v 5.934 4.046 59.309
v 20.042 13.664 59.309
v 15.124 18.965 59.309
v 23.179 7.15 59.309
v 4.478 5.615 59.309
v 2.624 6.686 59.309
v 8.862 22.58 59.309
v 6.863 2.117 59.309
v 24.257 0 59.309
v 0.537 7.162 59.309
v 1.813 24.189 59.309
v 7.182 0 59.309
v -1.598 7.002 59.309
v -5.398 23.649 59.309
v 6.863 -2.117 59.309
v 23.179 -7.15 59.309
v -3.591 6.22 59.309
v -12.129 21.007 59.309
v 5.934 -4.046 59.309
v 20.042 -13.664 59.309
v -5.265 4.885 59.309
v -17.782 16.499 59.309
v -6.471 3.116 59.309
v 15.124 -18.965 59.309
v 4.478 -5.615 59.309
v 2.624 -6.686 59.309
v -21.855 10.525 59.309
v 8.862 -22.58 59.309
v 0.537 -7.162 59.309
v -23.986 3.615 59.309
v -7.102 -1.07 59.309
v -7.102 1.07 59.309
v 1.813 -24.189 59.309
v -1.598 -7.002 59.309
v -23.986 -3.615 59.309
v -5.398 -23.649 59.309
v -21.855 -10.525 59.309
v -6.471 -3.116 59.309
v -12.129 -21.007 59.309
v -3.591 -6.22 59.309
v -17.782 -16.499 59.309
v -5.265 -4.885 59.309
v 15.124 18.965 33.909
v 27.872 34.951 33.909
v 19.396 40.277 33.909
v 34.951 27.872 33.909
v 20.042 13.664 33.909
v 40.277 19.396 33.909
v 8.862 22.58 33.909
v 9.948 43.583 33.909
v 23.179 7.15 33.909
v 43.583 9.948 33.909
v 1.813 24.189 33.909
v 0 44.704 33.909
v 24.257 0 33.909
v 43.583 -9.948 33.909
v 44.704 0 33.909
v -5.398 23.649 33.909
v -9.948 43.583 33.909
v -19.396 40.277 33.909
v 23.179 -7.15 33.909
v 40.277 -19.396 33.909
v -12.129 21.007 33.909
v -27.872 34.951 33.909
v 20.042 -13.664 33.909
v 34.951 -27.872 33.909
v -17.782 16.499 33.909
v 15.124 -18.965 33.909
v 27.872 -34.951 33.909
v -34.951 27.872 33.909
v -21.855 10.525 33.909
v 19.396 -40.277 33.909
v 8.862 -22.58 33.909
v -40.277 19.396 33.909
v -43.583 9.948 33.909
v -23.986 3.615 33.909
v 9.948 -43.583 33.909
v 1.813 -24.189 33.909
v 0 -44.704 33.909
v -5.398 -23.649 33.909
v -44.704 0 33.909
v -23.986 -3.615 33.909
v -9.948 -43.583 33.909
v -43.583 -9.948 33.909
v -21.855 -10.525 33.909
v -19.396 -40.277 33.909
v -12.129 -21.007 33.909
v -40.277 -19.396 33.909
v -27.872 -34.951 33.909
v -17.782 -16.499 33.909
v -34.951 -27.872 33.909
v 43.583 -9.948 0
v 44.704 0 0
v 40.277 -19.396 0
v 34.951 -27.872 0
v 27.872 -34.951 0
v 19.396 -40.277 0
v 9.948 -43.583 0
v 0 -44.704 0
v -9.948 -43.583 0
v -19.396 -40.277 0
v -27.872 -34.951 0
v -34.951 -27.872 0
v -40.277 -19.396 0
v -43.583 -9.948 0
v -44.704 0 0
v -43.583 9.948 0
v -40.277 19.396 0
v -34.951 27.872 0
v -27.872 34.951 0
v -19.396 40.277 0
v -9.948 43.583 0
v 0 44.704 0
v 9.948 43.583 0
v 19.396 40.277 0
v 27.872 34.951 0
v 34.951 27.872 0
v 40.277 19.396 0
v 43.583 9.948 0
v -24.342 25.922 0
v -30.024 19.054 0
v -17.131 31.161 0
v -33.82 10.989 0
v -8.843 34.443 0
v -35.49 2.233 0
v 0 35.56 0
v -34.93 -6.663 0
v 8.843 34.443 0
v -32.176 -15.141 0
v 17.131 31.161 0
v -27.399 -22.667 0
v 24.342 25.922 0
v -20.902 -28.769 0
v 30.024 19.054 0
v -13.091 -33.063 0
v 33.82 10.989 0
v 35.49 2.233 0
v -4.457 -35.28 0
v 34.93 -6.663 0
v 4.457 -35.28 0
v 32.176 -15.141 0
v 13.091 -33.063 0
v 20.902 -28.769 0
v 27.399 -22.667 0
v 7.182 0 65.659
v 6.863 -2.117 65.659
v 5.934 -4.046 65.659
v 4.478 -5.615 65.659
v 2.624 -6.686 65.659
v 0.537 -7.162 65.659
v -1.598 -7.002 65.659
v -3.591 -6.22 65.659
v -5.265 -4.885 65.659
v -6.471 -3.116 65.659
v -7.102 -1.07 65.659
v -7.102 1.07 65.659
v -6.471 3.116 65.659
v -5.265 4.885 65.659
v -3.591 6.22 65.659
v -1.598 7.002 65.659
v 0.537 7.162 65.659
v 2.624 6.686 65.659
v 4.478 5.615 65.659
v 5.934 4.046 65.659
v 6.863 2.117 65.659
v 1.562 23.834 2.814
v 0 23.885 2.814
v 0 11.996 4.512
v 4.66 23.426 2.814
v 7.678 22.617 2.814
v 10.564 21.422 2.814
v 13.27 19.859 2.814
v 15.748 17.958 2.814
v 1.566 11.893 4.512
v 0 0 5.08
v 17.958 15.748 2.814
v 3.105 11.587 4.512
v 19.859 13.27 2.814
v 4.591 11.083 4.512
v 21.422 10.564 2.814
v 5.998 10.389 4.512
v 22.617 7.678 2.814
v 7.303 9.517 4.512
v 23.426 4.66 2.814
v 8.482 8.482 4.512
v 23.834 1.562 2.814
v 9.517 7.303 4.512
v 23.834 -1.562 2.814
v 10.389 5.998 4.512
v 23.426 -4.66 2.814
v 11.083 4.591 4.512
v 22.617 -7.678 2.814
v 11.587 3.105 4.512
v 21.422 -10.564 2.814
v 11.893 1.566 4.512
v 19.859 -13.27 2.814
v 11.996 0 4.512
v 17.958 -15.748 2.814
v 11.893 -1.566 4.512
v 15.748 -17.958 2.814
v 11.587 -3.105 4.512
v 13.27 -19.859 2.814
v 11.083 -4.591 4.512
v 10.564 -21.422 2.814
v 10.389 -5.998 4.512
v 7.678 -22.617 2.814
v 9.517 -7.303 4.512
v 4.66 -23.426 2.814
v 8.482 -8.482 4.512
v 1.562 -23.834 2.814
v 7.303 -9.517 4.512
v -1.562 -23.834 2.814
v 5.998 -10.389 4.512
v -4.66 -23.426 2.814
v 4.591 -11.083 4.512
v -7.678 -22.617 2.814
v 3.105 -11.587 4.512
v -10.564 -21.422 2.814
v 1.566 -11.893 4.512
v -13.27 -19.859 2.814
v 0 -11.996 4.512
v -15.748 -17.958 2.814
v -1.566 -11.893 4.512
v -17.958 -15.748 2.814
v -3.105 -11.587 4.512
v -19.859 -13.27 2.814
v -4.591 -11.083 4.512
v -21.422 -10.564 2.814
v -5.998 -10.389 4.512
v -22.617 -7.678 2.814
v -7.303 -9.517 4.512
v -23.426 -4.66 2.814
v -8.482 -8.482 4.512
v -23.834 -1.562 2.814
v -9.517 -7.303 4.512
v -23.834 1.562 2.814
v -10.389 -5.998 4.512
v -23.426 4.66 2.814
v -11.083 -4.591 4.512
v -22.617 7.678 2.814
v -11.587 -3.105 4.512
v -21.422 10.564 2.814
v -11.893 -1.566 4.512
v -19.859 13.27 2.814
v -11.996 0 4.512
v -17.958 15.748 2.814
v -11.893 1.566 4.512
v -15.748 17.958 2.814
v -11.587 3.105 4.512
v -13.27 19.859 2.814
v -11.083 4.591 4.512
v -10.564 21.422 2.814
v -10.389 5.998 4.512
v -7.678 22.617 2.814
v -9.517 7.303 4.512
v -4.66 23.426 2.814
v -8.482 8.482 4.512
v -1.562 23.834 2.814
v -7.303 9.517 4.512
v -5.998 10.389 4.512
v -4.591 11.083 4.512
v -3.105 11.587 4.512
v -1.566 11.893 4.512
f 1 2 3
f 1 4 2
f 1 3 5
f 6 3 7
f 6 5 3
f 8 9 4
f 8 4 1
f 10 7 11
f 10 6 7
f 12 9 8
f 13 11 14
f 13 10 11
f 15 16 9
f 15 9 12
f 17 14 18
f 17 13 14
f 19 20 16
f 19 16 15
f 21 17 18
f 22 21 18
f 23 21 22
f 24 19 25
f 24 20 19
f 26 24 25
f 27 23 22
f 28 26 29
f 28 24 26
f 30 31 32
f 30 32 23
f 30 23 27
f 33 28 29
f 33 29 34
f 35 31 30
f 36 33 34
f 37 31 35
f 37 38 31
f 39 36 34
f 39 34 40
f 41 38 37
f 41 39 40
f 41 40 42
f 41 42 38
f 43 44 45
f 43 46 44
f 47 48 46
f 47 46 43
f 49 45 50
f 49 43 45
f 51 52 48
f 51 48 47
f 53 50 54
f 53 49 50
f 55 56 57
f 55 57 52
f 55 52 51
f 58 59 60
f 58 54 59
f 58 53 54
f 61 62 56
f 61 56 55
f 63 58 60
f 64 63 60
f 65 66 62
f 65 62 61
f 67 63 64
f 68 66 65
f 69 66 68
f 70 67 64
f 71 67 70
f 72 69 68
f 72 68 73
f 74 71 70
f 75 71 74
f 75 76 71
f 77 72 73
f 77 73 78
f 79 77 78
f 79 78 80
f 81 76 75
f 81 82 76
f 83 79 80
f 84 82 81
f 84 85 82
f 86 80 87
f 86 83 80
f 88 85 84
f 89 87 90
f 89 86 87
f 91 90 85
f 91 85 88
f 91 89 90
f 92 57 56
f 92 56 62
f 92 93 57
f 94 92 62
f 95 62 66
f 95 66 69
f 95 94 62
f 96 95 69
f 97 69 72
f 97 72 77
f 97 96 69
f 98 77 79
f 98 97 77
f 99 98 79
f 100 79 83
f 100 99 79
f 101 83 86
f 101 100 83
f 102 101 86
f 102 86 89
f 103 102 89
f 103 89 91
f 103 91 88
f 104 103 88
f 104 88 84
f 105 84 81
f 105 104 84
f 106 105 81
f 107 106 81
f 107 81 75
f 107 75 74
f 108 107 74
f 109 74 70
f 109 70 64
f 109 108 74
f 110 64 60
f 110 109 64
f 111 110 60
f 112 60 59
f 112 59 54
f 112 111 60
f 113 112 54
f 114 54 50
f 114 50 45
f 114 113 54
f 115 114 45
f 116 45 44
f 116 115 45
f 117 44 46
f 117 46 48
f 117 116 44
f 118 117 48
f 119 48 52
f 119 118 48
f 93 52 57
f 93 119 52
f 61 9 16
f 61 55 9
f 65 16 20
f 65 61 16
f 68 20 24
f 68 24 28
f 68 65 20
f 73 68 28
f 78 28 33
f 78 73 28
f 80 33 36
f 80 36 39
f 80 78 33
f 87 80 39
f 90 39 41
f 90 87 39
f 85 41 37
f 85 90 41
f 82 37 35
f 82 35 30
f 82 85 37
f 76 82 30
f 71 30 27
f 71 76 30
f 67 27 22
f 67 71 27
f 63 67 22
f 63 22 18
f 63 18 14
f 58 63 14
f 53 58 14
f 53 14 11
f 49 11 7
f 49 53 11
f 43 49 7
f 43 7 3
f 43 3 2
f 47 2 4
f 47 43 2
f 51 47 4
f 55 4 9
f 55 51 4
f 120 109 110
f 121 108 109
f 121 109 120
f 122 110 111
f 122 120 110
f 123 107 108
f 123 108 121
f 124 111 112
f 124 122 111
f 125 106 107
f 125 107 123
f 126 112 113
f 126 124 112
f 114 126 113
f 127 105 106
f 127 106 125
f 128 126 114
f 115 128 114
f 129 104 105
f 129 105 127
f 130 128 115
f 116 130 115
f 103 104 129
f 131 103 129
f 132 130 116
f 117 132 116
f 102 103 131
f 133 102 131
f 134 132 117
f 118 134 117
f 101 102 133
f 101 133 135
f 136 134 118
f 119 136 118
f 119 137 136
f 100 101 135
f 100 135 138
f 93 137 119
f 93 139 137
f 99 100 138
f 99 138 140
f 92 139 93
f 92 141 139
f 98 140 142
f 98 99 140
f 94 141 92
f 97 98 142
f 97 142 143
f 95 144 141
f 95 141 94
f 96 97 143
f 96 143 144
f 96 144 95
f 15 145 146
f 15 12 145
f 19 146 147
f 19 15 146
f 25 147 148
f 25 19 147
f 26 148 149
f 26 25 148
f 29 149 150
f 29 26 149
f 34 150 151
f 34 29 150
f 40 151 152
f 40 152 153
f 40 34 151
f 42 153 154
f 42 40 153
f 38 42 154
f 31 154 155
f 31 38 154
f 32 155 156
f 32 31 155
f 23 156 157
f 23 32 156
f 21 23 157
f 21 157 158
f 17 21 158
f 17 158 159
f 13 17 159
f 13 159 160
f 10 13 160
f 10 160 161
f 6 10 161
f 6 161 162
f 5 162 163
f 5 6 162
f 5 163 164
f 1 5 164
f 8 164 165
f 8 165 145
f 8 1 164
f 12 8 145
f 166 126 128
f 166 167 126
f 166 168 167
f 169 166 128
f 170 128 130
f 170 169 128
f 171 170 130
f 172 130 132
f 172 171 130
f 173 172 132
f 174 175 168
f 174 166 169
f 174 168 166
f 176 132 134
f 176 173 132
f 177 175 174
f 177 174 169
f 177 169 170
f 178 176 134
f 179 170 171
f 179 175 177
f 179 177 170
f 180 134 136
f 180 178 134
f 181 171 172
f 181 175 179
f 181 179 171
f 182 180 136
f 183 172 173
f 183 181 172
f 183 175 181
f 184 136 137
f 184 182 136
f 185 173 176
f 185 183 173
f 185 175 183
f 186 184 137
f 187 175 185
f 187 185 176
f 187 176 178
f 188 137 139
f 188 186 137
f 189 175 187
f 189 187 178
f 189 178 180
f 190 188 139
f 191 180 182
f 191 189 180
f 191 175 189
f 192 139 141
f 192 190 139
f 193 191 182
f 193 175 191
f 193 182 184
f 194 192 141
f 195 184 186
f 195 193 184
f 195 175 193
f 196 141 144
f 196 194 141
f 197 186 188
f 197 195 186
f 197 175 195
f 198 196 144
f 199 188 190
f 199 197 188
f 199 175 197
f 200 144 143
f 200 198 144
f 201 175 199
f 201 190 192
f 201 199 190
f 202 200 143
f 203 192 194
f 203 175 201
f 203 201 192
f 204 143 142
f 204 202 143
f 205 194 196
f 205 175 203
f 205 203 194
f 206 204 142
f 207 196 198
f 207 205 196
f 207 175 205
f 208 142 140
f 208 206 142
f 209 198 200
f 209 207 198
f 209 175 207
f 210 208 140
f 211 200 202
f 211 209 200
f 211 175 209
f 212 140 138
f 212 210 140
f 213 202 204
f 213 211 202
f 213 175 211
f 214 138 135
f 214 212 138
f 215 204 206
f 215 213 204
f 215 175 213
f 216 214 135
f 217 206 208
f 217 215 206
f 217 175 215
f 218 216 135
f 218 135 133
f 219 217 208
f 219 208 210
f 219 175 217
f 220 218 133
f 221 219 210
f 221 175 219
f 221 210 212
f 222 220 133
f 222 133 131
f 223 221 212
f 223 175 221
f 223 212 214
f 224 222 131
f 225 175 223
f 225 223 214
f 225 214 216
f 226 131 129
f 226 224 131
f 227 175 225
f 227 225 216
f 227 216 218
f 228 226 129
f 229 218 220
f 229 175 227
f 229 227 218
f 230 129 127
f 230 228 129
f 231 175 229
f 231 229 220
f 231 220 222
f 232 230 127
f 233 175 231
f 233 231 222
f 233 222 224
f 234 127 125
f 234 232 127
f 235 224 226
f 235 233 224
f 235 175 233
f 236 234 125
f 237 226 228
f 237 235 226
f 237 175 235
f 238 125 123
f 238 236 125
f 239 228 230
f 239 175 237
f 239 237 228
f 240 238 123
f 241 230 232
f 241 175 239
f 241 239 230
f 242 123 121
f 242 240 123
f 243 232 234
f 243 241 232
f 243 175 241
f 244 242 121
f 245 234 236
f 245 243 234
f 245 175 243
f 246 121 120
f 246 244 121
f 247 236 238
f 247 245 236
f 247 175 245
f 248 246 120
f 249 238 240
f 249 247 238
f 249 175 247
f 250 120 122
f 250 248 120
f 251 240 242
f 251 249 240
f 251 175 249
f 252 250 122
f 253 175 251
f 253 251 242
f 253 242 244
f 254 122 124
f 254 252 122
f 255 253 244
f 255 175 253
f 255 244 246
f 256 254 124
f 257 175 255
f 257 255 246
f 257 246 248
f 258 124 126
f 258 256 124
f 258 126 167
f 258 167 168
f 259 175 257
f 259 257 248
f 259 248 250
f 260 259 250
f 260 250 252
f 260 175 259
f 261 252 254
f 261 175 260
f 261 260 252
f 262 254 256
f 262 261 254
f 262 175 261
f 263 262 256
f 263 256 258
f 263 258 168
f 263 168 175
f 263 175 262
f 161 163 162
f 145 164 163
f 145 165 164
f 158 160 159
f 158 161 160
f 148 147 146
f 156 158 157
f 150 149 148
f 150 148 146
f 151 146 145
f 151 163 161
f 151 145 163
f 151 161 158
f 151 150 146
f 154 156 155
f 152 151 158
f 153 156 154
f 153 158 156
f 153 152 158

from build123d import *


with BuildPart() as part:
    # Sketch1 → Revolve1 (revolve)
    with BuildSketch(Plane(origin=(0, 0, 0), x_dir=(0, 0, -1), z_dir=(1, 0, 0))):
        Polygon((0, 0), (-65.659, 0), (-65.659, 7.182450088), (-59.309, 7.182450088), (-59.309, 24.257), (-33.909, 24.257), (-33.909, 44.704), (0, 44.704), align=None)
    revolve(axis=Axis((0, 0, 0), (0, 0, -1)))

    # Sketch2 → Cut-Revolve5 (revolve, cut)
    with BuildSketch(Plane(origin=(0, 0, 0), x_dir=(0, 0, -1), z_dir=(1, 0, 0))):
        with BuildLine():
            Line((-5.08, 0), (248.92, 0))
            ThreePointArc((248.92, 0), (121.92, 127), (-5.08, 0))
        make_face()
    revolve(axis=Axis((0, 0, 5.08), (0, 0, -1)), mode=Mode.SUBTRACT)


solid = part.part
